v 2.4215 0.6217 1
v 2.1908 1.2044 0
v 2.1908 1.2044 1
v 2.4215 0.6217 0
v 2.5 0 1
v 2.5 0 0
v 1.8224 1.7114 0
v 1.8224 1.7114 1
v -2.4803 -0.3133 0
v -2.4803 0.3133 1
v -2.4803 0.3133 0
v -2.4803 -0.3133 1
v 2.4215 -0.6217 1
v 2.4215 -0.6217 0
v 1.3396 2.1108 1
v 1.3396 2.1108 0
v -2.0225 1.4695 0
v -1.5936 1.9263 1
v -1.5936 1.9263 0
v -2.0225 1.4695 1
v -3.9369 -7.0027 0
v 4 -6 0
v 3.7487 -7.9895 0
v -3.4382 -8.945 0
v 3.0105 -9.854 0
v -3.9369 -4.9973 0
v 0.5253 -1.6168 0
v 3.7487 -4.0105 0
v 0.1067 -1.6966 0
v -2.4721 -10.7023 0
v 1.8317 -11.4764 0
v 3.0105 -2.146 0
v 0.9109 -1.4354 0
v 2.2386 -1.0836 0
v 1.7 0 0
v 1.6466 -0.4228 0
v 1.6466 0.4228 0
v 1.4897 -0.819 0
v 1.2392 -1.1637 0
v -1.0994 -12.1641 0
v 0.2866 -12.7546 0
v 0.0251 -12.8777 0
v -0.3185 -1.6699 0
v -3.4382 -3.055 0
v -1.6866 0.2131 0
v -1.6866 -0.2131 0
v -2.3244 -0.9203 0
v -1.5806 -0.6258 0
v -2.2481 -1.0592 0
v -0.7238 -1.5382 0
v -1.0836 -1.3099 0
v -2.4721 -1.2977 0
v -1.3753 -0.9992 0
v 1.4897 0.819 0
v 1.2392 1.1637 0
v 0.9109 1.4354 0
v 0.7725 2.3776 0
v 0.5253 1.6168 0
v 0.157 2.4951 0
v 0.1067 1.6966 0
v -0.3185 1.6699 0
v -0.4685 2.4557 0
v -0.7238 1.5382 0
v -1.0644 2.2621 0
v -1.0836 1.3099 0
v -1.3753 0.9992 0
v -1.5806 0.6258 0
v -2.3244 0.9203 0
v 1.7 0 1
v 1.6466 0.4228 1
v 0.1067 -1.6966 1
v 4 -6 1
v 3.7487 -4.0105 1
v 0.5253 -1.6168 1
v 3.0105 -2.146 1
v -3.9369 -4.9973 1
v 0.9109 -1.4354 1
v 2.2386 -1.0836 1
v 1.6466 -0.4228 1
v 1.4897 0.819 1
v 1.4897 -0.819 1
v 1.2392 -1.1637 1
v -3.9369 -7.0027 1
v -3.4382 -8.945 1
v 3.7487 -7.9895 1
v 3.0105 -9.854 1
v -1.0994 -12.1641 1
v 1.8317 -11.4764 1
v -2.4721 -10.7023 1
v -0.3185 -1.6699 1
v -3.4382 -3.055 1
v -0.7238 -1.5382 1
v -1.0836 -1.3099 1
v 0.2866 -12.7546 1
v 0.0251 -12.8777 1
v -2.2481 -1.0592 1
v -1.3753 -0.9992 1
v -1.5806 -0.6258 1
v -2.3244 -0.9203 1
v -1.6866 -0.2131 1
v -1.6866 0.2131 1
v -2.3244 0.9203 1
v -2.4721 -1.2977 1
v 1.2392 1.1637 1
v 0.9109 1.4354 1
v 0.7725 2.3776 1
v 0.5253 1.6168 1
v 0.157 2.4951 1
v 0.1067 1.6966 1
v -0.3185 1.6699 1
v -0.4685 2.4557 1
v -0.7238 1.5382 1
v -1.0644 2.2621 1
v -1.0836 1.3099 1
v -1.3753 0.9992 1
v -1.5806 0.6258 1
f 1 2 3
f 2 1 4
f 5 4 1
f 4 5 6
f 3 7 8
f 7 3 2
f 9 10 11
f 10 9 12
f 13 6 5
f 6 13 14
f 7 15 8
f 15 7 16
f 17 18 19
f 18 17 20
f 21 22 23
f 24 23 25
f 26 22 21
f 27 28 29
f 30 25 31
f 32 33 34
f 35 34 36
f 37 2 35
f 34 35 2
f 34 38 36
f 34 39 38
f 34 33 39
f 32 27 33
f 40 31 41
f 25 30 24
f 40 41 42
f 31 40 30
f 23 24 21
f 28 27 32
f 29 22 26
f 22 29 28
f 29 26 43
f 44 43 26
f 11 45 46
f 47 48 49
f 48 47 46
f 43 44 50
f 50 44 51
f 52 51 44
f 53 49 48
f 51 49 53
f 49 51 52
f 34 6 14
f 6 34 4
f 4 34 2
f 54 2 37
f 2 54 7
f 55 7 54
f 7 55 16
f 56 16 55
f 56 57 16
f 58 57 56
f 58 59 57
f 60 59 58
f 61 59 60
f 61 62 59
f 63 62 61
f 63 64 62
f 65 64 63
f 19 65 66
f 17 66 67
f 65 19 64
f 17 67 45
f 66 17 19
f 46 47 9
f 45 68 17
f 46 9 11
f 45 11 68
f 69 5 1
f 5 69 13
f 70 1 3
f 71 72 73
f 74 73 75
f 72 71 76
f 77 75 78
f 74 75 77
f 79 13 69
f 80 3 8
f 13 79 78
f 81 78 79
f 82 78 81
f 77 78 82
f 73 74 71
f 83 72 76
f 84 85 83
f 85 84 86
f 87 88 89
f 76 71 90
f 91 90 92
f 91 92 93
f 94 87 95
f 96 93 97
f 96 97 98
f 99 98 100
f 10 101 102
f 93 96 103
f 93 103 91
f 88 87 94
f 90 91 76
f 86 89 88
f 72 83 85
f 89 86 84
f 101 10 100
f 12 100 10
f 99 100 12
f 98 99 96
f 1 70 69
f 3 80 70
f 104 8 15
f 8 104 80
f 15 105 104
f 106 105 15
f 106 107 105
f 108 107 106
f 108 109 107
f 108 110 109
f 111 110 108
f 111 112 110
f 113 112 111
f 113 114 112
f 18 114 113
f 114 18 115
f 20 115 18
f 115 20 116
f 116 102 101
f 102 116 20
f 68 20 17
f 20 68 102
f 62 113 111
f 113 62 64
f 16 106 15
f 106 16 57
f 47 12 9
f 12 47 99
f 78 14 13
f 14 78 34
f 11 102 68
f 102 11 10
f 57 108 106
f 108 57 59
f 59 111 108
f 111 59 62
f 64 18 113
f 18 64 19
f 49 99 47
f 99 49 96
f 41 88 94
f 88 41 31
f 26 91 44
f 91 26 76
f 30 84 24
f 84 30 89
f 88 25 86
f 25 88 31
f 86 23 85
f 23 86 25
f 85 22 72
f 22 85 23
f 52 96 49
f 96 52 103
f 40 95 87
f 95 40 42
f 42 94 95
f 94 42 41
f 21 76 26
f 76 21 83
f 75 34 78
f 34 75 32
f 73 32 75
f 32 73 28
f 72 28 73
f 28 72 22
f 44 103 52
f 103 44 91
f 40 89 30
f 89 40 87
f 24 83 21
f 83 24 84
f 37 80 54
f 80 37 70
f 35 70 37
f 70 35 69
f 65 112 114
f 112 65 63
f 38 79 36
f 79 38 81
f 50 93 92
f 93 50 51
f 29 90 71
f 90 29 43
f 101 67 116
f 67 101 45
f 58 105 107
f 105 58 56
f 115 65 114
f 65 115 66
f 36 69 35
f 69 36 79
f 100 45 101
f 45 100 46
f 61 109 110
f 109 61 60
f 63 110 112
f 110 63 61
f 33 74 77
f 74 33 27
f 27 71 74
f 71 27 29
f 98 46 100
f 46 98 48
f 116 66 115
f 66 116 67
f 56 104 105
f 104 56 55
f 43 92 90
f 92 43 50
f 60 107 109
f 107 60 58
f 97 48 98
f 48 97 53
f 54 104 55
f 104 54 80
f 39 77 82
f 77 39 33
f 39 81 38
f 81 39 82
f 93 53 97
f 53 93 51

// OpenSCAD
// fixed to 3mm currently
module frame_backing_board_holder(thickness = 1, $fn = 25) {
    // backing board holders
    difference() {
        union() {
            cylinder(r=2.5, h=thickness, $fn=$fn);
            translate(v=[0, -6, 0])
                linear_extrude(thickness)
                    intersection() {
                        translate(v=[4, 0, 0])
                            circle(r=8);
                        translate(v=[-4, 0, 0])
                            circle(r=8);
                    }
        }
        // 3mm hole + tolerance/slop
        cylinder(r=1.5 + .2, h=thickness + 1, $fn=$fn);
    }
}

frame_backing_board_holder();
